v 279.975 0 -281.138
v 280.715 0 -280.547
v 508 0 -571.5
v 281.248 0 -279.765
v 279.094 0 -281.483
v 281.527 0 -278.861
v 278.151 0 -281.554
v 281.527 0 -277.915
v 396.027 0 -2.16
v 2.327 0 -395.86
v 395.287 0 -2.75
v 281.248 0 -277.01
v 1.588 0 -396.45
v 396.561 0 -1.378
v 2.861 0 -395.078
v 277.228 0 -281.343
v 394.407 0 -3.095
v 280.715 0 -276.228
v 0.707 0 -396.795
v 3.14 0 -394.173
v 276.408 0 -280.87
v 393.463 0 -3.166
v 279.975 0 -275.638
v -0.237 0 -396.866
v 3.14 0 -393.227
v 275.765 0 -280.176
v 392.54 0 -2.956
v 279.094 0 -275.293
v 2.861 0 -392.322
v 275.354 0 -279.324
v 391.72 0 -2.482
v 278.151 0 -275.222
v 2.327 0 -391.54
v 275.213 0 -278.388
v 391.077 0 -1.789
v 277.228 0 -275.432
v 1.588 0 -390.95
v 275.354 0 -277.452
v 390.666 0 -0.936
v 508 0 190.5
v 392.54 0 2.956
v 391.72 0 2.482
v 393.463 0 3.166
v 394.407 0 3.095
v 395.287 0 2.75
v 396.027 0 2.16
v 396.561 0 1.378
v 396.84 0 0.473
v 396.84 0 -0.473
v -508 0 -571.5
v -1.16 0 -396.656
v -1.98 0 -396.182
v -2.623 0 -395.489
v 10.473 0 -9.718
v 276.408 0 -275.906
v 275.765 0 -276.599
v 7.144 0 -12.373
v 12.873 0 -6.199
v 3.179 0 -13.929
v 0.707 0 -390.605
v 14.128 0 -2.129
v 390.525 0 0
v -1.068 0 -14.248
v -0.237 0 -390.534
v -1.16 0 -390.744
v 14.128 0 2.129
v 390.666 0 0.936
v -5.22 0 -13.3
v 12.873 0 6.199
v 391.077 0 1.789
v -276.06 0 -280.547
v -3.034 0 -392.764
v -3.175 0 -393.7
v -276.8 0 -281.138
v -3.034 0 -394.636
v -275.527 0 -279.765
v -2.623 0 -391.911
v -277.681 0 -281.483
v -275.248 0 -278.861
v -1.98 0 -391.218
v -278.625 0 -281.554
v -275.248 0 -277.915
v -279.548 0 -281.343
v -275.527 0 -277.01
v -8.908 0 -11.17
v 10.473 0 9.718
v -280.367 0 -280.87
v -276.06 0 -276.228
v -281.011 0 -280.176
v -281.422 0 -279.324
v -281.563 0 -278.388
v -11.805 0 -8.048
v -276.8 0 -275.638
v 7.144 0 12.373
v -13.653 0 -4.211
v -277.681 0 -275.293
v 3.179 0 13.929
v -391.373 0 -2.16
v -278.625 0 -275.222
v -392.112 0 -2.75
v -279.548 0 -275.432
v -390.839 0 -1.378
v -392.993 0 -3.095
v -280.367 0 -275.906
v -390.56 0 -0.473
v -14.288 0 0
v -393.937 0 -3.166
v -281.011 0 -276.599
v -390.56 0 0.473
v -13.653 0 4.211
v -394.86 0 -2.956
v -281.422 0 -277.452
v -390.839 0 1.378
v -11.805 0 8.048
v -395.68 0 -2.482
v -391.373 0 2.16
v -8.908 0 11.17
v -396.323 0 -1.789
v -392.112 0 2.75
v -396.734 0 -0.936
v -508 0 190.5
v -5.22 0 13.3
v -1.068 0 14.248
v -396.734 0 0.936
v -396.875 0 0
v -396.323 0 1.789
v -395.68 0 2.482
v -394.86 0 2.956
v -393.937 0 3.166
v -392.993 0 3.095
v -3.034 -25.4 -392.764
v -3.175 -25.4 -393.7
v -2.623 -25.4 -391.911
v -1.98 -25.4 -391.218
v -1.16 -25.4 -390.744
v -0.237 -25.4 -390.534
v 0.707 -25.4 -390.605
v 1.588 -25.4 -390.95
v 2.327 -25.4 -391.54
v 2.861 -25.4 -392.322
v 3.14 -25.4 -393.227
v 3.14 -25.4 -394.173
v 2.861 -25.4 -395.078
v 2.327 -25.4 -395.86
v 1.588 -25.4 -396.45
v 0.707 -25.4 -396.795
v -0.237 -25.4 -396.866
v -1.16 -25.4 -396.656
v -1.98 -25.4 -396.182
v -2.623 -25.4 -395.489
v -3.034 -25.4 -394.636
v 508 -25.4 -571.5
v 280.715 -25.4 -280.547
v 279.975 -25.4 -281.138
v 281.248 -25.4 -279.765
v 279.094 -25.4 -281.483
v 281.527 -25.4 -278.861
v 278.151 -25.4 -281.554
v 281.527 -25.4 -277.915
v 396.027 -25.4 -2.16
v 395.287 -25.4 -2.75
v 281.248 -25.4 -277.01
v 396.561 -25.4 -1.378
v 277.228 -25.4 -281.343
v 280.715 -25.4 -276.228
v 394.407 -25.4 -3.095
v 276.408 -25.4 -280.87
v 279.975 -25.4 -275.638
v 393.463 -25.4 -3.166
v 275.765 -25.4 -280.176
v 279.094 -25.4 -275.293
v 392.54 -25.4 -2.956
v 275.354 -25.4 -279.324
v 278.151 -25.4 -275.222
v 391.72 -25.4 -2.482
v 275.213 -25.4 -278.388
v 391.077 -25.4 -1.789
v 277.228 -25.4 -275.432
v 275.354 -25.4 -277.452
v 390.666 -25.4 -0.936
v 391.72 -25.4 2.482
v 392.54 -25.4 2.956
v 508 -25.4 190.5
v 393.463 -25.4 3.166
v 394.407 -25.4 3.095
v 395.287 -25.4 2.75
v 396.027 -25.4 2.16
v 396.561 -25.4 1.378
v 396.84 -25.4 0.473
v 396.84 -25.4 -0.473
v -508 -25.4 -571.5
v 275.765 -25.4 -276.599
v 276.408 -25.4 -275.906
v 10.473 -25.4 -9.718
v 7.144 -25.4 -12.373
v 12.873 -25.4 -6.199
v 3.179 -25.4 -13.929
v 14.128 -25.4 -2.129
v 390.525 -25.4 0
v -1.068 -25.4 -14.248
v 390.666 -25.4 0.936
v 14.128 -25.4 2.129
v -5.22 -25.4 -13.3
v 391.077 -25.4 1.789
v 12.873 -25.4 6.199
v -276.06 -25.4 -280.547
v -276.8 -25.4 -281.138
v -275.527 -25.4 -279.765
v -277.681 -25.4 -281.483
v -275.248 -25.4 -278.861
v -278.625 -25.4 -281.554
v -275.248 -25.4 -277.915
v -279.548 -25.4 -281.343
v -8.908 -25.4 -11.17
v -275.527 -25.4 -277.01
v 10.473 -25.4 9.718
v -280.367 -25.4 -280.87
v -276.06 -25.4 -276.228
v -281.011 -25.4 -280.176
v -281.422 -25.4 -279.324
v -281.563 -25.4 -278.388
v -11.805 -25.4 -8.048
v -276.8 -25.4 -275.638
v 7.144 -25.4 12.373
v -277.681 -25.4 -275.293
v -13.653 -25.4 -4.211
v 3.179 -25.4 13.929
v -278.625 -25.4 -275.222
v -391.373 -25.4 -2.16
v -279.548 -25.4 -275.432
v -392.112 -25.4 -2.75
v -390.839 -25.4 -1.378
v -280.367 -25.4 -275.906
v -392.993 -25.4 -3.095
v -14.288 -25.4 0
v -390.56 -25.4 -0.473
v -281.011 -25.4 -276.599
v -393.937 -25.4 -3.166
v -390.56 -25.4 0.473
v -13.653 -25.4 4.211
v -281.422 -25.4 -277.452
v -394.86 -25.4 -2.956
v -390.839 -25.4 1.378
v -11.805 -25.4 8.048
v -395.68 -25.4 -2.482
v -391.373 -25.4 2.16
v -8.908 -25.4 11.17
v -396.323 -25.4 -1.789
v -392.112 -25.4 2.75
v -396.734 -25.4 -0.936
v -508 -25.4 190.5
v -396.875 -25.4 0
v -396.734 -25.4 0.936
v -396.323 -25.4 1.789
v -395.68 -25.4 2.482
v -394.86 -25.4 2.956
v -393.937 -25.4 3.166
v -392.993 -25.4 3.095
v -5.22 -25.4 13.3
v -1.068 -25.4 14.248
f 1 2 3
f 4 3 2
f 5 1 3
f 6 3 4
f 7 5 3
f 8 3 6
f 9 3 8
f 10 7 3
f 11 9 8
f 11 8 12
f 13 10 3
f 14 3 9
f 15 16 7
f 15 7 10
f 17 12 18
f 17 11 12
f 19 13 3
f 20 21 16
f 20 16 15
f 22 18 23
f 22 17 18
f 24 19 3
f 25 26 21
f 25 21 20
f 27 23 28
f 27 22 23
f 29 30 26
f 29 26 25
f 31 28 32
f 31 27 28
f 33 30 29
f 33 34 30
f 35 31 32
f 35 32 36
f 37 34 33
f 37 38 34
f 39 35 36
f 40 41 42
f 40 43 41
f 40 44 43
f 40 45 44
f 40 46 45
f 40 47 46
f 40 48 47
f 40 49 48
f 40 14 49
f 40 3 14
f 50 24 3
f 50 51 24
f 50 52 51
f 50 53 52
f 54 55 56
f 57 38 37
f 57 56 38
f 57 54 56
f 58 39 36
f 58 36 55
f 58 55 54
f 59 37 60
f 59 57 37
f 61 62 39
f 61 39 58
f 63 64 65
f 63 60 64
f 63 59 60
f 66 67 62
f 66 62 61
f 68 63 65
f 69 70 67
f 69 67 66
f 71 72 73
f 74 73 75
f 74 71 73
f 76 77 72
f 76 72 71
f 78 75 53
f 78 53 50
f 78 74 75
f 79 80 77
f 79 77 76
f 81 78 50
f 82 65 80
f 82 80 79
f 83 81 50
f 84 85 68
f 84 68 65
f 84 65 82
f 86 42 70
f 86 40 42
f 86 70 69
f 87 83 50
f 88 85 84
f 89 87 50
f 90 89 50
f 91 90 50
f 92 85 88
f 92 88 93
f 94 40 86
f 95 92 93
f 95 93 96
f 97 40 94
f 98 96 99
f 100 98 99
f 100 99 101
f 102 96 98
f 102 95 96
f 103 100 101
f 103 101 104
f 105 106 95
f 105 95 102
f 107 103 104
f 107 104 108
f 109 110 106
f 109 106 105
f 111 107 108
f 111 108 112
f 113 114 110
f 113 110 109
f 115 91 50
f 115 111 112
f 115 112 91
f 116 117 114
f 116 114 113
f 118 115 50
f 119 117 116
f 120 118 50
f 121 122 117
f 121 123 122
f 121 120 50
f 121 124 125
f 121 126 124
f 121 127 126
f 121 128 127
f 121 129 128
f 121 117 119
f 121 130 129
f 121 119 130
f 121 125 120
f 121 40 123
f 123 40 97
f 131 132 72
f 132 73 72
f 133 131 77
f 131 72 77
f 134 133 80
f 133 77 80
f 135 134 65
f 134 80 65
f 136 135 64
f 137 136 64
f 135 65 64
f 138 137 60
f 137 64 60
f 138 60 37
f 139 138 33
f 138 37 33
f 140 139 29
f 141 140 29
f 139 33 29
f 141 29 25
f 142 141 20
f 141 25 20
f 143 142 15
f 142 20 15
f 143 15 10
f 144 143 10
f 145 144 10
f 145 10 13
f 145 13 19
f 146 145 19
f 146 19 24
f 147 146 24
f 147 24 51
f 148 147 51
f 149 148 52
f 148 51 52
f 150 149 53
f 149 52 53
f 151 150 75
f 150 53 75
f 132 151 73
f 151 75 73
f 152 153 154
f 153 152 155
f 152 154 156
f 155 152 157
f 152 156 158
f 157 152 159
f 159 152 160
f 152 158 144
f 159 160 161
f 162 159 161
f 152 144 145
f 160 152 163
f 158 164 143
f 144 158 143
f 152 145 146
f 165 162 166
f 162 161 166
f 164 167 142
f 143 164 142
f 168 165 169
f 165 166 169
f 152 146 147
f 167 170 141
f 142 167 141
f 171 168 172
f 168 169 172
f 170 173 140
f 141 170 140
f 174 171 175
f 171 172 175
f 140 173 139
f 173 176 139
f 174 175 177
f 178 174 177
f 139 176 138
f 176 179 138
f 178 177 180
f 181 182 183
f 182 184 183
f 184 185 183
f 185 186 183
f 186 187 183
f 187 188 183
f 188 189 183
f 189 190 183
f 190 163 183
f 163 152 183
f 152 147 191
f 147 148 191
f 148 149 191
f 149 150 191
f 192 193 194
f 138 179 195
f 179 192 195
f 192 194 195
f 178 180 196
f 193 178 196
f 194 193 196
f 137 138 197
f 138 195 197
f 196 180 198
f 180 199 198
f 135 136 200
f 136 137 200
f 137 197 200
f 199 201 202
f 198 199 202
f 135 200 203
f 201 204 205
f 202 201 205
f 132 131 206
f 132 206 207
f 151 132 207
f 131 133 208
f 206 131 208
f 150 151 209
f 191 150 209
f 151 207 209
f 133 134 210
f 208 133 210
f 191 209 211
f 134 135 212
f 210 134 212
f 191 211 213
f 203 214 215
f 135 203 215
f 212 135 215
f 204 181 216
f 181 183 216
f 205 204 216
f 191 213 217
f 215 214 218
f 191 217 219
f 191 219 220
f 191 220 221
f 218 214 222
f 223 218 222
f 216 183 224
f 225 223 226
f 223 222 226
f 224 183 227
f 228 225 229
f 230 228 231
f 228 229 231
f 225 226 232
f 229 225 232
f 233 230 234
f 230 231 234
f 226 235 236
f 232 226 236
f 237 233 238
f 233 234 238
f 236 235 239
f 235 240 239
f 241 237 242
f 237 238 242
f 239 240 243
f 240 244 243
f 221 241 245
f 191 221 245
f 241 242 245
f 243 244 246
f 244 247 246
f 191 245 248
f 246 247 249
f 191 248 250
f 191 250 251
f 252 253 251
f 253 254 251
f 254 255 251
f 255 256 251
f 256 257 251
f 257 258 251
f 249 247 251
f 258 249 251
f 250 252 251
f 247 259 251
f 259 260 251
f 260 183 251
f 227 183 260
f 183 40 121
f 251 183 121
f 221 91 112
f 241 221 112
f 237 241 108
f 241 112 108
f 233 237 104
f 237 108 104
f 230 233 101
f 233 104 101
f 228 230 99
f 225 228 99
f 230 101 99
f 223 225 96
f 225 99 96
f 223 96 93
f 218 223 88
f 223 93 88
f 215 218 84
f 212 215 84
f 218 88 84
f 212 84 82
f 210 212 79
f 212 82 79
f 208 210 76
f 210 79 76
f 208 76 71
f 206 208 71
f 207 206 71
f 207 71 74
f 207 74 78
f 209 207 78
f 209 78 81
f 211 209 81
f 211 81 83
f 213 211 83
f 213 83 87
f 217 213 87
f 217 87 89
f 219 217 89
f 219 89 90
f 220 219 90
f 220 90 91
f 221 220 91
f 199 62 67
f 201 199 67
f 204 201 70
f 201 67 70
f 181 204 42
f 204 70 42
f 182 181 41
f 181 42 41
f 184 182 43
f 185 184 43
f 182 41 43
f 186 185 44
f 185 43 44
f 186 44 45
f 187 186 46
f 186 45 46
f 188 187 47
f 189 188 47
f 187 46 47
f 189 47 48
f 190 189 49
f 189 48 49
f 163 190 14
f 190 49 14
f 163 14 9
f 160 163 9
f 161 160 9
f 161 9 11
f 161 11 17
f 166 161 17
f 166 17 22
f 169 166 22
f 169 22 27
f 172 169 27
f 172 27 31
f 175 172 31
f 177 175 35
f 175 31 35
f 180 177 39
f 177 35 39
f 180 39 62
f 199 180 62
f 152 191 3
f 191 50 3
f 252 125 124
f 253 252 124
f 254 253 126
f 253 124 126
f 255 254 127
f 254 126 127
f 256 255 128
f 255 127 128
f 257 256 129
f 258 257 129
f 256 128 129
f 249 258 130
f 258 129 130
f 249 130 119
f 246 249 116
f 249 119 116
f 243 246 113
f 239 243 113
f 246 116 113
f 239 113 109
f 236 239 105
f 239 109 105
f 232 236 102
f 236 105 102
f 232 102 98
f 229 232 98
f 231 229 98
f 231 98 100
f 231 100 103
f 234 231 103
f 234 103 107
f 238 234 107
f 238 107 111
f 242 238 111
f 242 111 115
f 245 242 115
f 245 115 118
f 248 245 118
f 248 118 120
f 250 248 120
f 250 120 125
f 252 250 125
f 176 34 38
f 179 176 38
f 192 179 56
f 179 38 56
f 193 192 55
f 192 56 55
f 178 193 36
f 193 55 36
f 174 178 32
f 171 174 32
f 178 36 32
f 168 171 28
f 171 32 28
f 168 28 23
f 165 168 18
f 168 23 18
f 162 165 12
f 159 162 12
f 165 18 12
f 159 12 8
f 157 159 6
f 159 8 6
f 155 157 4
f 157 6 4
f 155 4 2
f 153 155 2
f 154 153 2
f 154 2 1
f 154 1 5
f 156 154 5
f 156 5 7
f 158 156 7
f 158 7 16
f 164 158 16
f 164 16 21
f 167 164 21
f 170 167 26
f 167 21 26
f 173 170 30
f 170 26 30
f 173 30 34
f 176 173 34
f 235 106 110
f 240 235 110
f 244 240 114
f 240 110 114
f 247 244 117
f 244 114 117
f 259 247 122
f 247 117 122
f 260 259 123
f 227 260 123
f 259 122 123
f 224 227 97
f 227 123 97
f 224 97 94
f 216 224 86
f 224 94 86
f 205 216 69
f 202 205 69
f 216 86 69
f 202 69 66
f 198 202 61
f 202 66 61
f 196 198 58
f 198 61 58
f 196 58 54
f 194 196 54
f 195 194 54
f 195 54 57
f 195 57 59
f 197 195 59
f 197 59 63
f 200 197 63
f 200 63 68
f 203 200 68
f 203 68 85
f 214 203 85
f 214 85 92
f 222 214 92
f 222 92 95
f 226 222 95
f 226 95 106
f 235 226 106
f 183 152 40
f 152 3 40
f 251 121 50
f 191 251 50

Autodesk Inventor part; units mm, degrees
ref_plane "YZ Plane" through (0, 0, 0) normal (1, 0, 0) x (0, 1, 0)
ref_plane "XZ Plane" through (0, 0, 0) normal (0, 1, 0) x (-1, 0, 0)
ref_plane "XY Plane" through (0, 0, 0) normal (0, 0, 1) x (1, 0, 0)
sketch "Sketch1" plane through (0, 0, 0) normal (0, 1, 0) x (-1, 0, 0)
  line L0 (508, -571.5) -> (-508, -571.5)
  line L1 (-508, -571.5) -> (-508, 190.5)
  line L2 (-508, 190.5) -> (508, 190.5)
  line L3 (508, 190.5) -> (508, -571.5)
  circle A0 centre (0, 0) radius 14.2875
  line L4 (508, 0) -> (-508, 0) construction
  arc A1 (-393.7, 0) -> (393.7, 0) centre (0, 0) ccw construction
  circle A2 centre (393.7, 0) radius 3.175
  circle A3 centre (0, -393.7) radius 3.175
  circle A4 centre (-393.7, 0) radius 3.175
  circle A5 centre (278.3879, -278.3879) radius 3.175
  line L5 (0, 0) -> (278.3879, -278.3879) construction
  circle A6 centre (-278.3879, -278.3879) radius 3.175
  line L6 (-278.3879, -278.3879) -> (0, 0) construction
  dimension "d0" = 1016
  dimension "d2" = 762
  dimension "d4" = 508
  dimension "d5" = 28.575
  dimension "d9" = 787.4
  dimension "d10" = 393.7
  dimension "d11" = 508
  dimension "d12" = 6.35
  dimension "d13" = 6.35
  dimension "d14" = 6.35
  dimension "d15" = 6.35
  dimension "d16" = 45
  dimension "d17" = 6.35
  dimension "d18" = 45
  dimension "d19" = 571.5
extrude "Extrusion1" add sketch "Sketch1" against normal blind 25.4
equation "\"d4\" = 0.5 * d0"
equation "\"d19\" = 0.75 * d2"
properties part number "Shooter Base Plate"
